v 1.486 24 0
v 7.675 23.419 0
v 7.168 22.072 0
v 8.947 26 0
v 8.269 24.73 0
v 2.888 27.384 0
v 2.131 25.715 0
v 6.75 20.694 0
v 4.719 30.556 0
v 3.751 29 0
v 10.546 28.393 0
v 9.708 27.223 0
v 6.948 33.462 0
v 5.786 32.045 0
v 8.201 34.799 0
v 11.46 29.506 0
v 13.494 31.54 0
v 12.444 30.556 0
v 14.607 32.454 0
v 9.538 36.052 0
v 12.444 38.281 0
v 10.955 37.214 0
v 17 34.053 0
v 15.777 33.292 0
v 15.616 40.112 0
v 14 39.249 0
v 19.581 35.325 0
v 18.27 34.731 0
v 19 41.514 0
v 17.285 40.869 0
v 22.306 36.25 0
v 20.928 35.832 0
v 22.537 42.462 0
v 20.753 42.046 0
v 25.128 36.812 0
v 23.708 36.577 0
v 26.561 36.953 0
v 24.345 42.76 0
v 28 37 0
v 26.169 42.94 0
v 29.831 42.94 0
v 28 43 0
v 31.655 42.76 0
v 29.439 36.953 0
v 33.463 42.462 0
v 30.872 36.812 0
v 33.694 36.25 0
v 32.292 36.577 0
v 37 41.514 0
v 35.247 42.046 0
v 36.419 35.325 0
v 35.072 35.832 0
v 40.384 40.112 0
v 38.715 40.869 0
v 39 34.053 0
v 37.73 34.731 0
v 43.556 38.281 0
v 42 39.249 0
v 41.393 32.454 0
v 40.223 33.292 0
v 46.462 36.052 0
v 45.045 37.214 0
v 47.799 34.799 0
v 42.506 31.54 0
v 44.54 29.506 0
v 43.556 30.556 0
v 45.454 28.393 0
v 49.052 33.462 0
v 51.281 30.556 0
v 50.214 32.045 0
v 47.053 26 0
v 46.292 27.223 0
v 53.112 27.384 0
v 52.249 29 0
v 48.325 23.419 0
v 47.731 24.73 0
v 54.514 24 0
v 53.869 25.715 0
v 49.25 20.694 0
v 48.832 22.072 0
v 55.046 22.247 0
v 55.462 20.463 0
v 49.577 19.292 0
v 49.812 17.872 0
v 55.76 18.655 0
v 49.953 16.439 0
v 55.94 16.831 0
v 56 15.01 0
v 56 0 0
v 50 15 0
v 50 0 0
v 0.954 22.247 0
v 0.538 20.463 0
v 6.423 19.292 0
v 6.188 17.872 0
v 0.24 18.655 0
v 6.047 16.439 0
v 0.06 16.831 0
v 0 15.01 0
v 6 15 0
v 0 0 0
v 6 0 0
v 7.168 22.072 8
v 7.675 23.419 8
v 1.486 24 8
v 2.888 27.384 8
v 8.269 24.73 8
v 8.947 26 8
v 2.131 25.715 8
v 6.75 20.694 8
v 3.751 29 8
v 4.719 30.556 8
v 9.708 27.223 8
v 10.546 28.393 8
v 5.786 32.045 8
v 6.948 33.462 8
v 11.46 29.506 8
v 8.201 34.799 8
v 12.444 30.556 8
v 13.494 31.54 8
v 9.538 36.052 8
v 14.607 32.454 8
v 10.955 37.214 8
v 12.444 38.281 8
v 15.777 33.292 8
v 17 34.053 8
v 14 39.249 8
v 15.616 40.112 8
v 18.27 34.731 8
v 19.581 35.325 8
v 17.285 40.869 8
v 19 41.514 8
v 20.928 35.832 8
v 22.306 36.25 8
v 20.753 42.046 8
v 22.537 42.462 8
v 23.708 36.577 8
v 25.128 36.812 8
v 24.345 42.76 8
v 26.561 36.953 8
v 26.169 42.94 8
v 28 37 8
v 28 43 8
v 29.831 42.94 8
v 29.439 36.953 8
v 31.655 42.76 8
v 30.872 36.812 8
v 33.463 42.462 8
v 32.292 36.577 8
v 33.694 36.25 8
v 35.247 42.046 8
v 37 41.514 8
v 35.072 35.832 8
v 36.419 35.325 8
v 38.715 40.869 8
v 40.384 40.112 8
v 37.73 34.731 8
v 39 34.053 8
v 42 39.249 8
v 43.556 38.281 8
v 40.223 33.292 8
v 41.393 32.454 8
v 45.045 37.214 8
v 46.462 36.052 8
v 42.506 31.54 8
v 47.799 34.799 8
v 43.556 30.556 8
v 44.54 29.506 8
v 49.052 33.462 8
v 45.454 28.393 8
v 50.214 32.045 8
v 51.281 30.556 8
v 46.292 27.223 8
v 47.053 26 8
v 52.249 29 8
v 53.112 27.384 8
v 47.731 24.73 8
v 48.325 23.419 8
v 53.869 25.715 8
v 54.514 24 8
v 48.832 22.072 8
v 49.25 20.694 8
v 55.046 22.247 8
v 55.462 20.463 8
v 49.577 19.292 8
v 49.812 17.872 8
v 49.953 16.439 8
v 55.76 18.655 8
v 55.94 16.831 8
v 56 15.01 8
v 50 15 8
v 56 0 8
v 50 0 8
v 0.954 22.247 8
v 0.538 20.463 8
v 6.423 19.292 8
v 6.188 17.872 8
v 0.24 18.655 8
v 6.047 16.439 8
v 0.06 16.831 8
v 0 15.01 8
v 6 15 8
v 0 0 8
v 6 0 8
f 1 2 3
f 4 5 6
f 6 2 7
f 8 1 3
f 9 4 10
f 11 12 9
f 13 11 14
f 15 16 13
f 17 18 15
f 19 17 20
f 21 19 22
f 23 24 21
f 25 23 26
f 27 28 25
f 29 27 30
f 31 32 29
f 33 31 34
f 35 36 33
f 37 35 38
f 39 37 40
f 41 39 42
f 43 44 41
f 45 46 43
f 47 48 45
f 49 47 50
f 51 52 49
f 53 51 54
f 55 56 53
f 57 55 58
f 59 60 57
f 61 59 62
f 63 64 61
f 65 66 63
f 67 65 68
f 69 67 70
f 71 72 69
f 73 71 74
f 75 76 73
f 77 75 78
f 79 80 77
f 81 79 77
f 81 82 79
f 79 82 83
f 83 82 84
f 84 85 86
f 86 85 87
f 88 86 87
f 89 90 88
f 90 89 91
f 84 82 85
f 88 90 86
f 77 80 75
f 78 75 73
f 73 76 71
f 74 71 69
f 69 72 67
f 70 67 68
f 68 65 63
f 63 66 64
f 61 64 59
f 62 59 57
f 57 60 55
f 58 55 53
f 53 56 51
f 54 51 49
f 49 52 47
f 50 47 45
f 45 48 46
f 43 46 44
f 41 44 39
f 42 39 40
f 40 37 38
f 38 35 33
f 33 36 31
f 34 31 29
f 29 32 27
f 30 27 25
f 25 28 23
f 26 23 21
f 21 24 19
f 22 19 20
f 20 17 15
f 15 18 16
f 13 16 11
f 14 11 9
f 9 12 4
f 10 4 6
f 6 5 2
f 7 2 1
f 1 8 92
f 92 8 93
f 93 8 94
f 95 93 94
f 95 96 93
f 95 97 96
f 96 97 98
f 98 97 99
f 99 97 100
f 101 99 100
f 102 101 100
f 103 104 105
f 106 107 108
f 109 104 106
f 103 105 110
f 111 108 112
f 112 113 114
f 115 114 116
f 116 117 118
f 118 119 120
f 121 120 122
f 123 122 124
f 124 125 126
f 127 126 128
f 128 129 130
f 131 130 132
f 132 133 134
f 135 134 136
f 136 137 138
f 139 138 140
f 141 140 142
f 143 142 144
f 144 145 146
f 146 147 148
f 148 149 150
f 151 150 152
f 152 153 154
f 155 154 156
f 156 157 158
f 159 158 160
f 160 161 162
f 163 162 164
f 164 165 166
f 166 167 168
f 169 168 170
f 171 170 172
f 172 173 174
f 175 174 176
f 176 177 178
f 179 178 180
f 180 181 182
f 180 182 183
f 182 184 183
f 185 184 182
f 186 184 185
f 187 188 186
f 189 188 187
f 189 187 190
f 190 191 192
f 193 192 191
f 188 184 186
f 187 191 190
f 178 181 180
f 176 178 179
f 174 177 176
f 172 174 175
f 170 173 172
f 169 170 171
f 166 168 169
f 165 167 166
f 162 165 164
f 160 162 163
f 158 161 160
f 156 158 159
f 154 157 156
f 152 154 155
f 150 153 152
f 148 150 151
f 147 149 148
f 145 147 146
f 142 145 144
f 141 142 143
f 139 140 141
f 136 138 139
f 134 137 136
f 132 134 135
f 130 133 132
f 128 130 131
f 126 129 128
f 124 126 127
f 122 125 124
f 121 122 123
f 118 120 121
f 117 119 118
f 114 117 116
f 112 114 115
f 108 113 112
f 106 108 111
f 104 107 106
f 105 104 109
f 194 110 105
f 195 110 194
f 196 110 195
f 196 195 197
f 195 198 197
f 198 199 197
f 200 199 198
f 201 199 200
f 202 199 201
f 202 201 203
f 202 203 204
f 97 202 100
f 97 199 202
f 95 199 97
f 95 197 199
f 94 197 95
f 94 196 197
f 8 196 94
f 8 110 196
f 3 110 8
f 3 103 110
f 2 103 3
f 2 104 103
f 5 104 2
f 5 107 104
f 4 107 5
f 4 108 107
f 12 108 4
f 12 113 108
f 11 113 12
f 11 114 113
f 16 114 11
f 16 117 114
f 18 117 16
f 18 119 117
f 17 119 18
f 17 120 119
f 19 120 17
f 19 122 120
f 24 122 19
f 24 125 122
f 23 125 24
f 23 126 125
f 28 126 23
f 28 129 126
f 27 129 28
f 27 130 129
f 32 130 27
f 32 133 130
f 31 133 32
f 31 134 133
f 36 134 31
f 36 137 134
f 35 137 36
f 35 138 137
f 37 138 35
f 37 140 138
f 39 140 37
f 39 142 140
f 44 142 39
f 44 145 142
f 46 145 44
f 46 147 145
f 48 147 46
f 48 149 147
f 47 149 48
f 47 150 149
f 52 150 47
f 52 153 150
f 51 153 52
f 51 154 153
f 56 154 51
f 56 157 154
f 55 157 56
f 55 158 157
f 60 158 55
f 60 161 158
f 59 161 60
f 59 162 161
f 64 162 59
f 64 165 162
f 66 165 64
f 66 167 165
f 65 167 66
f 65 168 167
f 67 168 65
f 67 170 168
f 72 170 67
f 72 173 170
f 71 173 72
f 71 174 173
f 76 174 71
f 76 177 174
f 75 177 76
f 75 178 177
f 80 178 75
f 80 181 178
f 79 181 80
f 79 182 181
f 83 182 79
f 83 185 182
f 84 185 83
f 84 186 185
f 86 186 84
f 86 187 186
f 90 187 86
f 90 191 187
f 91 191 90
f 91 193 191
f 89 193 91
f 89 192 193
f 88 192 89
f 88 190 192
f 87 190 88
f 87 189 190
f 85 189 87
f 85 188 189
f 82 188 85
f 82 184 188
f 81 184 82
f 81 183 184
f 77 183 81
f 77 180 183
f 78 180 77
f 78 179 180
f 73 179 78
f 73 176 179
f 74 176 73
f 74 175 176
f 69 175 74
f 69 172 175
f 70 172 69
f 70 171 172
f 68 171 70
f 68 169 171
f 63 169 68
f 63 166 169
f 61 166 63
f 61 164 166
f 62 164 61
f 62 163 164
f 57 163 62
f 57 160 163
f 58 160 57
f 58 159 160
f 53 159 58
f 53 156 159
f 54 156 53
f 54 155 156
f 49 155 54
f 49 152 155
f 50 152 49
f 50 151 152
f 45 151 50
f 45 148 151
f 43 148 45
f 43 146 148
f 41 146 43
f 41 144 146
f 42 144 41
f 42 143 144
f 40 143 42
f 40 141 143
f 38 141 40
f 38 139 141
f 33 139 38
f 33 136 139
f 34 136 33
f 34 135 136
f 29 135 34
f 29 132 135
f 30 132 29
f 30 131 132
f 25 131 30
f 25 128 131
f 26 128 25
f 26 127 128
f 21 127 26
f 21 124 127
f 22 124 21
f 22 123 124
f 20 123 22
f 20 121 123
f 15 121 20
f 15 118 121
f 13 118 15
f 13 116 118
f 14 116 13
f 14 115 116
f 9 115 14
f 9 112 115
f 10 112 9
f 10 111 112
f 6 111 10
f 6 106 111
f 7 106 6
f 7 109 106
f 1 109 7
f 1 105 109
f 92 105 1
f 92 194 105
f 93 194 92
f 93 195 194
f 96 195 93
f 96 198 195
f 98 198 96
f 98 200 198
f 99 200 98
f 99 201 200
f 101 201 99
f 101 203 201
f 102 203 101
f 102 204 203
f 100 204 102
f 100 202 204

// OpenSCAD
$fn=96;
radius=25;
linear_extrude(8) union(){translate([0,0]) square([6,15.01]); translate([2*radius,0]) square([6,15.01]); intersection(){translate([radius+3,15]) difference(){circle(r=radius+3);circle(r=radius-3);} translate([-1,15]) square([2*radius+8,radius+4]);}}
